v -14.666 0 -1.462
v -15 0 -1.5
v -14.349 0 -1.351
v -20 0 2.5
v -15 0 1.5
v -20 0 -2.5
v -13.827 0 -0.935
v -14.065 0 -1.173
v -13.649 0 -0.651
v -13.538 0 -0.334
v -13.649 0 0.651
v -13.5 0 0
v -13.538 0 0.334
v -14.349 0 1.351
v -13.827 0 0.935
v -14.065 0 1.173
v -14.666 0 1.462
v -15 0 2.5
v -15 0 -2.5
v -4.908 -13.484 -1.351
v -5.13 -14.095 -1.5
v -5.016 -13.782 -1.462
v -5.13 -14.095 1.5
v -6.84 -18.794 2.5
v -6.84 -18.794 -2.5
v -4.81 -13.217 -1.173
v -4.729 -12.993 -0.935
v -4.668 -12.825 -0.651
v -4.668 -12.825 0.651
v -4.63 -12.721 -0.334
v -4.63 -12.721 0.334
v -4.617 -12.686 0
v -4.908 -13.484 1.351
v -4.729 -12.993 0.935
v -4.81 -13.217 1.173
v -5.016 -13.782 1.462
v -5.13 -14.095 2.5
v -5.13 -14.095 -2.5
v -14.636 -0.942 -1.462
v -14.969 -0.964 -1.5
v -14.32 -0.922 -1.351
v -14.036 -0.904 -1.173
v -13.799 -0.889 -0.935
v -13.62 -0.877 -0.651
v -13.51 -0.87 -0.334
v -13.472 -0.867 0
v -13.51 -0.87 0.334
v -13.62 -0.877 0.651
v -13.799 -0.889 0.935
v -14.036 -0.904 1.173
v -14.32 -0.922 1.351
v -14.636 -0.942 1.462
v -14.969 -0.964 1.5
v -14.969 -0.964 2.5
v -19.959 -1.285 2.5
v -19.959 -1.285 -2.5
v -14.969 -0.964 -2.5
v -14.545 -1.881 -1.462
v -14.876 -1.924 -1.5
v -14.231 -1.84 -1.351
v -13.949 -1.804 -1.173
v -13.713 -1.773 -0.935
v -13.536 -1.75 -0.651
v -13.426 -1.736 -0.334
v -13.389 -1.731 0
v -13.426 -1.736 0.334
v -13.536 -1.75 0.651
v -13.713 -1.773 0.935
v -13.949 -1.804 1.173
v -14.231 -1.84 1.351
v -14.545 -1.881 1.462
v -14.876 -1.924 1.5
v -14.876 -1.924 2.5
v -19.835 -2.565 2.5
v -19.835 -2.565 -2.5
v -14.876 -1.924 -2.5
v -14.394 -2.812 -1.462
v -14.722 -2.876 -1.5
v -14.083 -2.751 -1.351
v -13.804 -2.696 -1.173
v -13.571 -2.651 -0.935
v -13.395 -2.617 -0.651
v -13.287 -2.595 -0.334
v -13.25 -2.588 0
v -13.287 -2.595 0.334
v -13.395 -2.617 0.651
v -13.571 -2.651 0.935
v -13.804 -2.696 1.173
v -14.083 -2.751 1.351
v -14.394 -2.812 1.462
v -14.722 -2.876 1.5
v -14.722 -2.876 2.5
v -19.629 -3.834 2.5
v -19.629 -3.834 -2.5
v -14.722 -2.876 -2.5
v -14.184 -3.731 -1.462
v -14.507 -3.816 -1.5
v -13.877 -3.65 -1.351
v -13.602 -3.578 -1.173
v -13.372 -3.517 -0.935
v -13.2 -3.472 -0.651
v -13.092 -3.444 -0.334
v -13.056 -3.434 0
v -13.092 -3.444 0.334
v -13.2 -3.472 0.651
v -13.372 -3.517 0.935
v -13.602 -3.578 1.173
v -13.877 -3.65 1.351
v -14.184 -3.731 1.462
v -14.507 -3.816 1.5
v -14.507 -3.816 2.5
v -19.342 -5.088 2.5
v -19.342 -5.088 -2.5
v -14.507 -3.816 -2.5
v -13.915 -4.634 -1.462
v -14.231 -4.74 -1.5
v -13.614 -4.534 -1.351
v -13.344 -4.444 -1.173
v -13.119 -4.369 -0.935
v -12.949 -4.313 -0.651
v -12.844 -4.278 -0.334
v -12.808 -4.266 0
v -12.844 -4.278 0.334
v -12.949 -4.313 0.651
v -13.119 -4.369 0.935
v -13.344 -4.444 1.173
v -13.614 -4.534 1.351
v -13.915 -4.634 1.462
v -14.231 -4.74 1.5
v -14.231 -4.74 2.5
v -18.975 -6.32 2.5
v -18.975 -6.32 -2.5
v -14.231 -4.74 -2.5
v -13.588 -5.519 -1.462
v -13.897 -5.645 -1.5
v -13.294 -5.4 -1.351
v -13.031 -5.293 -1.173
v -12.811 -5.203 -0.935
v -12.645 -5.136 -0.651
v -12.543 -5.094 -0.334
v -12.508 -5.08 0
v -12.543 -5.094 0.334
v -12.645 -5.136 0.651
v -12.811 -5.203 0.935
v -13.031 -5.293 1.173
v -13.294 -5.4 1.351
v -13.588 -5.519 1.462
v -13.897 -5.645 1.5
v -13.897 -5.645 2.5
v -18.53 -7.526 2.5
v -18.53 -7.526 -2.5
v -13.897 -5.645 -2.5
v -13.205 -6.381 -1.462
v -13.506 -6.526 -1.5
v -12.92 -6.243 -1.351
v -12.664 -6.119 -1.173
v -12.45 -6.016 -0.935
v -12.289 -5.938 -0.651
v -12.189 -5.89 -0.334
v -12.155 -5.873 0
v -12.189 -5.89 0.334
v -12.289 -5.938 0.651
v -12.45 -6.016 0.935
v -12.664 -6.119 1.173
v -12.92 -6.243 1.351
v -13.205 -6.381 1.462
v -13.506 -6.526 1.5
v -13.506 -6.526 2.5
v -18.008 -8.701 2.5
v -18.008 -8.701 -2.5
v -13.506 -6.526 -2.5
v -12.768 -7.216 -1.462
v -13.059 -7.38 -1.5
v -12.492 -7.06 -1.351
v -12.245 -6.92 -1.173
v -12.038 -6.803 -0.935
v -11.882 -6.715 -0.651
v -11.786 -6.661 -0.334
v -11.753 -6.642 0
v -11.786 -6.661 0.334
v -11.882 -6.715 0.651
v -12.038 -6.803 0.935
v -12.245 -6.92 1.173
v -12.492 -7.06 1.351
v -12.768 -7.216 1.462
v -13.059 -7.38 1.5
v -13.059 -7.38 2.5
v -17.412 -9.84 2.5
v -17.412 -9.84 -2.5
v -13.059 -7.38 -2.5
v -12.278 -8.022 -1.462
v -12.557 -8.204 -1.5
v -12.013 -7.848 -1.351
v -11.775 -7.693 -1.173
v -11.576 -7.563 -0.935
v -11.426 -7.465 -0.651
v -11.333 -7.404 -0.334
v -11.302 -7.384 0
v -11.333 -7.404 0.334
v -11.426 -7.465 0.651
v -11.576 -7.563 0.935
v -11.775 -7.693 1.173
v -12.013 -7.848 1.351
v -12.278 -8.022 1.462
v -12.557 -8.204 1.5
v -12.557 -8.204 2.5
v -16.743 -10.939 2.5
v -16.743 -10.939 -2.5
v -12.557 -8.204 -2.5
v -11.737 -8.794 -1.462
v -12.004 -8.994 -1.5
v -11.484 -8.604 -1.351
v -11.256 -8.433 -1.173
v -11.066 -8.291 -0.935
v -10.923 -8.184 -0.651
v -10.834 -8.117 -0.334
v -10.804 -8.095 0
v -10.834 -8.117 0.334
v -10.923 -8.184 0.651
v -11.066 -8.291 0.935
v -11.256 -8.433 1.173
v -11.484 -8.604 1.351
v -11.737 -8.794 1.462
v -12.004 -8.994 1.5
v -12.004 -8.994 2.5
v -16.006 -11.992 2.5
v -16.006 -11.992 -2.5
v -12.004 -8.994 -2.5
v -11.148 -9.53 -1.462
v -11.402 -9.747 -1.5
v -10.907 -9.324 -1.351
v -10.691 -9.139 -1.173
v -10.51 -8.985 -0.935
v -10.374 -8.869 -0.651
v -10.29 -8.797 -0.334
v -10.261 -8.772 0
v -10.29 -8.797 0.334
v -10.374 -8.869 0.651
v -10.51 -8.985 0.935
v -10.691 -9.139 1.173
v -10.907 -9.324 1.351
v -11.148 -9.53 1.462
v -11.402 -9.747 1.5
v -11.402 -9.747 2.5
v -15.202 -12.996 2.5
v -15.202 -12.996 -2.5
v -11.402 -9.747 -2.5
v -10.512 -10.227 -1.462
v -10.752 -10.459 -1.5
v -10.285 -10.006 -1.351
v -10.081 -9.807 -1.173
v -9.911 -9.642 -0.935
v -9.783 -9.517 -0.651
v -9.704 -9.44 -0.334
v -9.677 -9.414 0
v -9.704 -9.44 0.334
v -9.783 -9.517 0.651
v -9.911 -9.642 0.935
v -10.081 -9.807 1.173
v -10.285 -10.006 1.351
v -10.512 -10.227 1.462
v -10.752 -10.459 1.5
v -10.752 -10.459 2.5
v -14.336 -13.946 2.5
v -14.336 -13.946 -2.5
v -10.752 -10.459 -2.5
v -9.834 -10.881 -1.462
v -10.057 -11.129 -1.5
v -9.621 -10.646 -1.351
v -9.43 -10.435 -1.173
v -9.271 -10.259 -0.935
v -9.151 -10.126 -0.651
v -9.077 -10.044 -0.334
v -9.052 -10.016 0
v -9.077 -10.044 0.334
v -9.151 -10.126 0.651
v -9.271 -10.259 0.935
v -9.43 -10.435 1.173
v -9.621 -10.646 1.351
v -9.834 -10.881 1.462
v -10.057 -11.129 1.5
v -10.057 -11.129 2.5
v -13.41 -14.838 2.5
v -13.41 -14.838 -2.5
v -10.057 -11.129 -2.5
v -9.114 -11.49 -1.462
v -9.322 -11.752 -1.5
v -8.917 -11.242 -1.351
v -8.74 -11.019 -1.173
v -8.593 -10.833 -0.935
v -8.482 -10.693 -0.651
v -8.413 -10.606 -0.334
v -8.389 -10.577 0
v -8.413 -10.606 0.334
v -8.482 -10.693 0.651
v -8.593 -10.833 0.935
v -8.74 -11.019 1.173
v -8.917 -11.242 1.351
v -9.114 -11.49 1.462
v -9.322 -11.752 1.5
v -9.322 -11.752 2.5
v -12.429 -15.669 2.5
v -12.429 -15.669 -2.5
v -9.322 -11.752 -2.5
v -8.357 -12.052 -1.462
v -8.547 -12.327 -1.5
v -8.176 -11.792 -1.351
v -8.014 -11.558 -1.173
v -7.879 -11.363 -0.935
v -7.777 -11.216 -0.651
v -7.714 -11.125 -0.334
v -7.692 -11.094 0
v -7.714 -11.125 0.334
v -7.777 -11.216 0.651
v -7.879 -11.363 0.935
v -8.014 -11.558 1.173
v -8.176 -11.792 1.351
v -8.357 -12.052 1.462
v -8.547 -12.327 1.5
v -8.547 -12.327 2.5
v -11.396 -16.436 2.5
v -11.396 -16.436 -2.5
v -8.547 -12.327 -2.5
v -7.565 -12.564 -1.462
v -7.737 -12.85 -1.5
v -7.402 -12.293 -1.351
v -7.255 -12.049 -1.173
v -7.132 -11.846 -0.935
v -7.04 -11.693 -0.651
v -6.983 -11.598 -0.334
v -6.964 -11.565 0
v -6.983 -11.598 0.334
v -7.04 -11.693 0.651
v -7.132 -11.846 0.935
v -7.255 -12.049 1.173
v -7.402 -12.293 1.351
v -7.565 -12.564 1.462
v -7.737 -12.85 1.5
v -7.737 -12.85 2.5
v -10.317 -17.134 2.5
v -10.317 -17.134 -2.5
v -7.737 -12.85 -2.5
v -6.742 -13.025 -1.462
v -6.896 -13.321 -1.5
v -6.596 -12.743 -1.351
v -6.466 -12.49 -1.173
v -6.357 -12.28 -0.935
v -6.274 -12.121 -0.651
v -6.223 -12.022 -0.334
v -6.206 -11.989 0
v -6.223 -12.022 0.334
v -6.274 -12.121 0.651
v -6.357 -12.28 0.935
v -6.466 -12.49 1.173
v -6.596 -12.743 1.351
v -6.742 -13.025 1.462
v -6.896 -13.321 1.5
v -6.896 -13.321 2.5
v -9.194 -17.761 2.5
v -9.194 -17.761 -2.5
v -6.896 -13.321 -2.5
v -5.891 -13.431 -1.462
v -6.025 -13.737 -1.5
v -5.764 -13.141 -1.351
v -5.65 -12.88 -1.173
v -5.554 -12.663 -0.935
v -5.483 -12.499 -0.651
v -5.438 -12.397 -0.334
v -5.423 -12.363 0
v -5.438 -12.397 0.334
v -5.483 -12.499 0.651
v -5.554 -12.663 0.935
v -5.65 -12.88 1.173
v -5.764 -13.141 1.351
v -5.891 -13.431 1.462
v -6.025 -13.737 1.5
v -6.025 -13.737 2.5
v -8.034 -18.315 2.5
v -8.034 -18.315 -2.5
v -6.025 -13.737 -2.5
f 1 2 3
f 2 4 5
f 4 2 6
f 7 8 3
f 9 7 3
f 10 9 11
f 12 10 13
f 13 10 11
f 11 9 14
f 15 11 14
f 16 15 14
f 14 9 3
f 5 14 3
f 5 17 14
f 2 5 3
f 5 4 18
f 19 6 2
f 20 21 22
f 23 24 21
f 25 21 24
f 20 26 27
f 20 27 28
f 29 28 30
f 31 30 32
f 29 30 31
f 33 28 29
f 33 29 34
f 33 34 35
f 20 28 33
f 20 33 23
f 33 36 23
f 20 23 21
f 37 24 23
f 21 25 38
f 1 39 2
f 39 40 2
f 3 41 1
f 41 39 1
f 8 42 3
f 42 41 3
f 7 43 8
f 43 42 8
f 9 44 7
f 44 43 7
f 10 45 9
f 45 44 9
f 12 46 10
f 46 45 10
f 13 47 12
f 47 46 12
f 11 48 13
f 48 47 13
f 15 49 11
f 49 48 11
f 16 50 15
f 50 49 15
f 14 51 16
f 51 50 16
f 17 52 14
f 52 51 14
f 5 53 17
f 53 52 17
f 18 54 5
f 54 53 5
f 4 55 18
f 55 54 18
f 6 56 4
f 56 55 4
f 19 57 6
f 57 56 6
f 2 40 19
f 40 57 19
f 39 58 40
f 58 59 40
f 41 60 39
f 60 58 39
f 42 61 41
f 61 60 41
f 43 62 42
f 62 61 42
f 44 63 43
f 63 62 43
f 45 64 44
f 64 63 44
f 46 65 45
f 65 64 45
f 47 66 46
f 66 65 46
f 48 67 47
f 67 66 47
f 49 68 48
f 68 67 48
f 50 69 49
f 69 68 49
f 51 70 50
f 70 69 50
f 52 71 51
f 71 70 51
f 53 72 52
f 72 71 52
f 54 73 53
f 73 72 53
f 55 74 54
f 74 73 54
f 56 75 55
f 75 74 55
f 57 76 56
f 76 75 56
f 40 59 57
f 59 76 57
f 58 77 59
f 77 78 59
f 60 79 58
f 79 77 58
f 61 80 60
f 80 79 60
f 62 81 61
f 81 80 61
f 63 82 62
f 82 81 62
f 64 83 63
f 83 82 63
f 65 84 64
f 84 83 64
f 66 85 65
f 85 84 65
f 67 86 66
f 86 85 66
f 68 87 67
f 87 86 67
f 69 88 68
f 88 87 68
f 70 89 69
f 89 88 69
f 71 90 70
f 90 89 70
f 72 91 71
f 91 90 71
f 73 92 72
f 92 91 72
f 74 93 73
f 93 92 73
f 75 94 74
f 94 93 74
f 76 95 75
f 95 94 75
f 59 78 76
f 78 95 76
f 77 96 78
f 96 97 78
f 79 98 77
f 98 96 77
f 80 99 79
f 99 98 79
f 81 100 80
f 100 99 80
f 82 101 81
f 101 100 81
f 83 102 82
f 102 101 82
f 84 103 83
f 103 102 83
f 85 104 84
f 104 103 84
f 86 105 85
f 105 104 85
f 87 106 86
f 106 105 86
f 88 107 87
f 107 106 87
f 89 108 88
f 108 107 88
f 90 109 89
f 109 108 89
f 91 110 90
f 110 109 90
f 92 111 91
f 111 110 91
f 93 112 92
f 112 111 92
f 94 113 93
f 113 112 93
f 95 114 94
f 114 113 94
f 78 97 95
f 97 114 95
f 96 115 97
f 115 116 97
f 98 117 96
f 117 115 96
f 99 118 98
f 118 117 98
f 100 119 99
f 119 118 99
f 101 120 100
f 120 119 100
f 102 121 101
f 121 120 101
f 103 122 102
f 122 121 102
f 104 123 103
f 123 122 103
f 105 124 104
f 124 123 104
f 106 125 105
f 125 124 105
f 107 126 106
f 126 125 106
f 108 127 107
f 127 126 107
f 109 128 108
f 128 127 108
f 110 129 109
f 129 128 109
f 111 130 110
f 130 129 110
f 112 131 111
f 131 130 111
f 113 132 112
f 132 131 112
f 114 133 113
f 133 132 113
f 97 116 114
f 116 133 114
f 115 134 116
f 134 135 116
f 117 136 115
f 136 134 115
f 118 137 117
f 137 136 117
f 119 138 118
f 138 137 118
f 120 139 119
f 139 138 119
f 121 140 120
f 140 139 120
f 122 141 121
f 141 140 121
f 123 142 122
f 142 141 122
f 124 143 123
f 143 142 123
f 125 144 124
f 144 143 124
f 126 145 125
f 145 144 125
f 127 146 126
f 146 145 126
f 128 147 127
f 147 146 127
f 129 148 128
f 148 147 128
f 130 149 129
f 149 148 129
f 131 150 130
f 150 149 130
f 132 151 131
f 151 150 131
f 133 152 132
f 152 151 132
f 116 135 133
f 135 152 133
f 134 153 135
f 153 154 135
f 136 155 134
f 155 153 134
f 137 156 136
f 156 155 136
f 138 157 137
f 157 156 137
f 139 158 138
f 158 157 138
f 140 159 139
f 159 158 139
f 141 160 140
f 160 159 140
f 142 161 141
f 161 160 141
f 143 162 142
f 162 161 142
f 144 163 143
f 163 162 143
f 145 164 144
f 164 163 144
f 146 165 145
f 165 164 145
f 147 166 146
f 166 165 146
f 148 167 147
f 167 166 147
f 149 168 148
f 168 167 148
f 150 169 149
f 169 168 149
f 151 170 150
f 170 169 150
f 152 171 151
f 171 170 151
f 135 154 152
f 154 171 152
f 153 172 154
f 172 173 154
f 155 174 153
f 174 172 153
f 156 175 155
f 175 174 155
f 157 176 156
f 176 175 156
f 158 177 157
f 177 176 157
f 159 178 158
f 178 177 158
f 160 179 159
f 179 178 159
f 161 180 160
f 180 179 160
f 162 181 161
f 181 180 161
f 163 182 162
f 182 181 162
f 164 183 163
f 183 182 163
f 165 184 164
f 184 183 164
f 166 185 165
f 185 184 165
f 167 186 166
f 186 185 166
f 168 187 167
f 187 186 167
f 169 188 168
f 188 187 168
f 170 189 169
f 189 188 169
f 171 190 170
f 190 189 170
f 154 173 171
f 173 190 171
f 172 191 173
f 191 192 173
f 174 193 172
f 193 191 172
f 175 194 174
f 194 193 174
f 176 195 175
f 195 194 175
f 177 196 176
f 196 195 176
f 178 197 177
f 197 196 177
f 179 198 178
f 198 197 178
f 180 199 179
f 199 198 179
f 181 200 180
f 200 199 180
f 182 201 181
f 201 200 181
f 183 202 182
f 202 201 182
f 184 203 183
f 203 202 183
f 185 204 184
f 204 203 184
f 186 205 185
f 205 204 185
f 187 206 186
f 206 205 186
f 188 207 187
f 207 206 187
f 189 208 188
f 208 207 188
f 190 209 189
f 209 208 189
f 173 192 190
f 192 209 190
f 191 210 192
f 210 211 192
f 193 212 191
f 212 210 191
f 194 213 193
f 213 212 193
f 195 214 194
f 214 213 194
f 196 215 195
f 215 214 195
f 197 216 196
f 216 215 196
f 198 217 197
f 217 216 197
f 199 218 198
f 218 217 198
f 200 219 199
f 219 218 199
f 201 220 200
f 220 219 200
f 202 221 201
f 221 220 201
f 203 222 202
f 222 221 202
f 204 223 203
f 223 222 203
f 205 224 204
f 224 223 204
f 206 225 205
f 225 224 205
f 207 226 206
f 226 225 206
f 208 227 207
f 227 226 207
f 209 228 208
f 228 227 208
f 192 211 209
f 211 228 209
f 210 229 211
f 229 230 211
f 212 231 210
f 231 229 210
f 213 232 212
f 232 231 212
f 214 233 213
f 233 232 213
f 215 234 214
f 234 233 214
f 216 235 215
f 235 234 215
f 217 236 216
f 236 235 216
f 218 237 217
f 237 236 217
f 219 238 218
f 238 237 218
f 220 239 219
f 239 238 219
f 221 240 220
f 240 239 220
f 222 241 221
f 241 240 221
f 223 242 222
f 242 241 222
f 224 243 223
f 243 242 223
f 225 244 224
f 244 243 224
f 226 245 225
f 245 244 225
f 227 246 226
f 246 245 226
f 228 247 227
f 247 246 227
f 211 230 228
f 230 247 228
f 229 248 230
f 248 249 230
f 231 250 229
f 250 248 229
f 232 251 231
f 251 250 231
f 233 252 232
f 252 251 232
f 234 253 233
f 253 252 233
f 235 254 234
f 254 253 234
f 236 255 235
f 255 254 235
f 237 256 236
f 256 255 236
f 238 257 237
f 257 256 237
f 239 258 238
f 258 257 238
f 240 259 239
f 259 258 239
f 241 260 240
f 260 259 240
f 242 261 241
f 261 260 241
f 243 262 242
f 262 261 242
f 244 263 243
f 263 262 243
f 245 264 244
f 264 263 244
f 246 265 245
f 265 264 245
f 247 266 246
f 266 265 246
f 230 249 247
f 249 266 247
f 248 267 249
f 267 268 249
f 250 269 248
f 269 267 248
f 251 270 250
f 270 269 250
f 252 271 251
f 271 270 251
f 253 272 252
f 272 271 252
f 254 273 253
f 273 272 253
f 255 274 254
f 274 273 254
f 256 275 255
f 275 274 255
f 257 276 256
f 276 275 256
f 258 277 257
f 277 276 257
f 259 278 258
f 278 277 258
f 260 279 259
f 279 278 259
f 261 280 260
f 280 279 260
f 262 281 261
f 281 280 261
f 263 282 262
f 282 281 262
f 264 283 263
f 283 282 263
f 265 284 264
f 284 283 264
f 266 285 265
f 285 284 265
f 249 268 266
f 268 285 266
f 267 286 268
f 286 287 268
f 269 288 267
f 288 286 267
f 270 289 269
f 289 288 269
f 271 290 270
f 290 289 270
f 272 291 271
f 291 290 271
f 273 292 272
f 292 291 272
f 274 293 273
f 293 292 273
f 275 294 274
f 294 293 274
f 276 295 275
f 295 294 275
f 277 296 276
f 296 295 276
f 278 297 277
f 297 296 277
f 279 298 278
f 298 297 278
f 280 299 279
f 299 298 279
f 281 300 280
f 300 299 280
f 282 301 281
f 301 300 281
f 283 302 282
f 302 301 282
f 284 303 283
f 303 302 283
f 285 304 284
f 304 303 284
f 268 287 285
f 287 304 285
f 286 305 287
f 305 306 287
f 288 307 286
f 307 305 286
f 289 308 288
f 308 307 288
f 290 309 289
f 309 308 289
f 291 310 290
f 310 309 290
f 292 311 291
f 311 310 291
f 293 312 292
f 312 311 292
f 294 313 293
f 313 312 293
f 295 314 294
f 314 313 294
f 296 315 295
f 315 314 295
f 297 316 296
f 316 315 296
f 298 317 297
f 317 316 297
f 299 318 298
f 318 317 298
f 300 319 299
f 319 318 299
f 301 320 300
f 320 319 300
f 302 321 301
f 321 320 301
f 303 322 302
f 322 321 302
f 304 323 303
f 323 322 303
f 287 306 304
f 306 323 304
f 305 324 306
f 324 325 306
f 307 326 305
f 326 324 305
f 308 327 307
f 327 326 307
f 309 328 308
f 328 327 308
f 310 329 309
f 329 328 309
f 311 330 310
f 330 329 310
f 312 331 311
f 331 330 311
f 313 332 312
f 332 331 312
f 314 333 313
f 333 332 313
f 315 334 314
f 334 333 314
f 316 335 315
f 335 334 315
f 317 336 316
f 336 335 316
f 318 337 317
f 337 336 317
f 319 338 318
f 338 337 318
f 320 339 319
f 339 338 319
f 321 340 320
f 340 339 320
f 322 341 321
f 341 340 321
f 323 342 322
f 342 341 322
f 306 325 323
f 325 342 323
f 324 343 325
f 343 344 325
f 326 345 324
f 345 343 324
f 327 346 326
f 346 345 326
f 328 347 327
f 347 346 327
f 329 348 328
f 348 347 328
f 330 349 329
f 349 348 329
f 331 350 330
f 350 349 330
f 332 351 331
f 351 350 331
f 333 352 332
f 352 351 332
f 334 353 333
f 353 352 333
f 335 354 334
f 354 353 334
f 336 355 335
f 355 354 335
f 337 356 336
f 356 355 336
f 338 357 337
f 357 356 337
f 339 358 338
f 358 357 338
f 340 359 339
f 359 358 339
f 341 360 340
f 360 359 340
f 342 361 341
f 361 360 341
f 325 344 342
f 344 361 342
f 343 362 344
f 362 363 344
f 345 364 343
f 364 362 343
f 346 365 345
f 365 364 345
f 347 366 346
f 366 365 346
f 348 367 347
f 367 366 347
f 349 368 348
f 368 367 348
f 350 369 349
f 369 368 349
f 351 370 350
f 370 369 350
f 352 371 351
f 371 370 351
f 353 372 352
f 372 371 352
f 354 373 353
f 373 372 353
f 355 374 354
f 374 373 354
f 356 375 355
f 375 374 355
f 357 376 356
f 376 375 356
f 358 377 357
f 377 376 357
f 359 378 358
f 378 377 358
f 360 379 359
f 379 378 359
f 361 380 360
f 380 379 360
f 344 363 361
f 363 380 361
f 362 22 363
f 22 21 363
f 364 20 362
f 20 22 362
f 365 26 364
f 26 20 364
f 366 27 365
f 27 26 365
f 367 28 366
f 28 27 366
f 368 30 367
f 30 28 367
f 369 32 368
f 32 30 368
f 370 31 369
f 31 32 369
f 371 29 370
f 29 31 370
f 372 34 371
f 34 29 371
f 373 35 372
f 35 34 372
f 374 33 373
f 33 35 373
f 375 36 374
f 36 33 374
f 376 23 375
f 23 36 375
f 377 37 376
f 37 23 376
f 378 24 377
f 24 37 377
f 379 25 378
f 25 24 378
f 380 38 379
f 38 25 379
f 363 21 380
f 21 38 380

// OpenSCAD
arch_base = 5;
arch_angle = 70;
archi_radius = 20;

rotate_extrude( angle = arch_angle, $fn = 100)
translate( [ -archi_radius, 0 ] )
union() {
    translate( [0, -arch_base / 2] )
        square( arch_base );

    translate( [arch_base, 0])
        circle( d = arch_base * 3 / 5, $fn=28);
    }
